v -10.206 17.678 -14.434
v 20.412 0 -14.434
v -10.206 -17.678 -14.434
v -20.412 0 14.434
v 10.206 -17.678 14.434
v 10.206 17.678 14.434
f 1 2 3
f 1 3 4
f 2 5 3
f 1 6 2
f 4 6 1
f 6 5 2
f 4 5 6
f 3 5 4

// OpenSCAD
// file edge_platonic_solids.scad
// creates platonic solids specified by length of an edge in mm
// (c) 2020 Rich Cameron
// released under a Creative Commons CC-BY 4.0 International License

edge = 50 / sqrt(2); //length of the edge of each solid
// to get just one solid, comment out the others

%rotate([45, 35, 0]) cube(48.8, center = true);

//translate(edge * [.75, -.75, 0]) tetrahedron(edge);
//translate(edge * [1.5, 1.5, 0]) cube(edge);
octahedron(edge, true);
//translate(edge * [2, 0, 0]) dodecahedron(edge);
//translate(edge * [.5, 1.6, 0]) icosahedron(edge);

//%cube(1, center = true);

phi = (1 + sqrt(5)) / 2;

module tetrahedron(edge = 1, center = false) translate([0, 0, center ? 0 : edge * sqrt(2) / sqrt(3) / 2]) cylinder(r1 = edge / sqrt(3), r2 = 0, h = edge * sqrt(2) / sqrt(3), center = true, $fn = 3);

module octahedron(edge = 1, center = false) translate([0, 0, center ? 0 : edge * sqrt(2) / sqrt(3) / 2]) hull() for(i = [0, 1]) mirror([0, 0, i]) mirror([i, 0, 0]) tetrahedron(edge, true);
	
module dodecahedron(edge = 1, center = false) scale(pow(phi, 5 / 2) / pow(5, 1 / 4)) translate([0, 0, center ? 0 : edge / 2]) intersection_for(a = [0:72:360]) rotate([0, a ? atan(2) : 0, a]) cylinder(r = edge, h = edge, center = true, $fn = 10);

module icosahedron(edge = 1, center = false) scale(pow(phi, 2) / sqrt(3)) translate([0, 0, center ? 0 : edge / 2]) intersection_for(a = [0:120:360], b = [-60, 0, 60]) rotate([0, a ? acos(sqrt(5) / 3) : 0, a]) rotate([0, b ? acos(sqrt(5) / 3) : 0, a ? b : 0]) cylinder(r = edge, h = edge, $fn = 6, center = true);
